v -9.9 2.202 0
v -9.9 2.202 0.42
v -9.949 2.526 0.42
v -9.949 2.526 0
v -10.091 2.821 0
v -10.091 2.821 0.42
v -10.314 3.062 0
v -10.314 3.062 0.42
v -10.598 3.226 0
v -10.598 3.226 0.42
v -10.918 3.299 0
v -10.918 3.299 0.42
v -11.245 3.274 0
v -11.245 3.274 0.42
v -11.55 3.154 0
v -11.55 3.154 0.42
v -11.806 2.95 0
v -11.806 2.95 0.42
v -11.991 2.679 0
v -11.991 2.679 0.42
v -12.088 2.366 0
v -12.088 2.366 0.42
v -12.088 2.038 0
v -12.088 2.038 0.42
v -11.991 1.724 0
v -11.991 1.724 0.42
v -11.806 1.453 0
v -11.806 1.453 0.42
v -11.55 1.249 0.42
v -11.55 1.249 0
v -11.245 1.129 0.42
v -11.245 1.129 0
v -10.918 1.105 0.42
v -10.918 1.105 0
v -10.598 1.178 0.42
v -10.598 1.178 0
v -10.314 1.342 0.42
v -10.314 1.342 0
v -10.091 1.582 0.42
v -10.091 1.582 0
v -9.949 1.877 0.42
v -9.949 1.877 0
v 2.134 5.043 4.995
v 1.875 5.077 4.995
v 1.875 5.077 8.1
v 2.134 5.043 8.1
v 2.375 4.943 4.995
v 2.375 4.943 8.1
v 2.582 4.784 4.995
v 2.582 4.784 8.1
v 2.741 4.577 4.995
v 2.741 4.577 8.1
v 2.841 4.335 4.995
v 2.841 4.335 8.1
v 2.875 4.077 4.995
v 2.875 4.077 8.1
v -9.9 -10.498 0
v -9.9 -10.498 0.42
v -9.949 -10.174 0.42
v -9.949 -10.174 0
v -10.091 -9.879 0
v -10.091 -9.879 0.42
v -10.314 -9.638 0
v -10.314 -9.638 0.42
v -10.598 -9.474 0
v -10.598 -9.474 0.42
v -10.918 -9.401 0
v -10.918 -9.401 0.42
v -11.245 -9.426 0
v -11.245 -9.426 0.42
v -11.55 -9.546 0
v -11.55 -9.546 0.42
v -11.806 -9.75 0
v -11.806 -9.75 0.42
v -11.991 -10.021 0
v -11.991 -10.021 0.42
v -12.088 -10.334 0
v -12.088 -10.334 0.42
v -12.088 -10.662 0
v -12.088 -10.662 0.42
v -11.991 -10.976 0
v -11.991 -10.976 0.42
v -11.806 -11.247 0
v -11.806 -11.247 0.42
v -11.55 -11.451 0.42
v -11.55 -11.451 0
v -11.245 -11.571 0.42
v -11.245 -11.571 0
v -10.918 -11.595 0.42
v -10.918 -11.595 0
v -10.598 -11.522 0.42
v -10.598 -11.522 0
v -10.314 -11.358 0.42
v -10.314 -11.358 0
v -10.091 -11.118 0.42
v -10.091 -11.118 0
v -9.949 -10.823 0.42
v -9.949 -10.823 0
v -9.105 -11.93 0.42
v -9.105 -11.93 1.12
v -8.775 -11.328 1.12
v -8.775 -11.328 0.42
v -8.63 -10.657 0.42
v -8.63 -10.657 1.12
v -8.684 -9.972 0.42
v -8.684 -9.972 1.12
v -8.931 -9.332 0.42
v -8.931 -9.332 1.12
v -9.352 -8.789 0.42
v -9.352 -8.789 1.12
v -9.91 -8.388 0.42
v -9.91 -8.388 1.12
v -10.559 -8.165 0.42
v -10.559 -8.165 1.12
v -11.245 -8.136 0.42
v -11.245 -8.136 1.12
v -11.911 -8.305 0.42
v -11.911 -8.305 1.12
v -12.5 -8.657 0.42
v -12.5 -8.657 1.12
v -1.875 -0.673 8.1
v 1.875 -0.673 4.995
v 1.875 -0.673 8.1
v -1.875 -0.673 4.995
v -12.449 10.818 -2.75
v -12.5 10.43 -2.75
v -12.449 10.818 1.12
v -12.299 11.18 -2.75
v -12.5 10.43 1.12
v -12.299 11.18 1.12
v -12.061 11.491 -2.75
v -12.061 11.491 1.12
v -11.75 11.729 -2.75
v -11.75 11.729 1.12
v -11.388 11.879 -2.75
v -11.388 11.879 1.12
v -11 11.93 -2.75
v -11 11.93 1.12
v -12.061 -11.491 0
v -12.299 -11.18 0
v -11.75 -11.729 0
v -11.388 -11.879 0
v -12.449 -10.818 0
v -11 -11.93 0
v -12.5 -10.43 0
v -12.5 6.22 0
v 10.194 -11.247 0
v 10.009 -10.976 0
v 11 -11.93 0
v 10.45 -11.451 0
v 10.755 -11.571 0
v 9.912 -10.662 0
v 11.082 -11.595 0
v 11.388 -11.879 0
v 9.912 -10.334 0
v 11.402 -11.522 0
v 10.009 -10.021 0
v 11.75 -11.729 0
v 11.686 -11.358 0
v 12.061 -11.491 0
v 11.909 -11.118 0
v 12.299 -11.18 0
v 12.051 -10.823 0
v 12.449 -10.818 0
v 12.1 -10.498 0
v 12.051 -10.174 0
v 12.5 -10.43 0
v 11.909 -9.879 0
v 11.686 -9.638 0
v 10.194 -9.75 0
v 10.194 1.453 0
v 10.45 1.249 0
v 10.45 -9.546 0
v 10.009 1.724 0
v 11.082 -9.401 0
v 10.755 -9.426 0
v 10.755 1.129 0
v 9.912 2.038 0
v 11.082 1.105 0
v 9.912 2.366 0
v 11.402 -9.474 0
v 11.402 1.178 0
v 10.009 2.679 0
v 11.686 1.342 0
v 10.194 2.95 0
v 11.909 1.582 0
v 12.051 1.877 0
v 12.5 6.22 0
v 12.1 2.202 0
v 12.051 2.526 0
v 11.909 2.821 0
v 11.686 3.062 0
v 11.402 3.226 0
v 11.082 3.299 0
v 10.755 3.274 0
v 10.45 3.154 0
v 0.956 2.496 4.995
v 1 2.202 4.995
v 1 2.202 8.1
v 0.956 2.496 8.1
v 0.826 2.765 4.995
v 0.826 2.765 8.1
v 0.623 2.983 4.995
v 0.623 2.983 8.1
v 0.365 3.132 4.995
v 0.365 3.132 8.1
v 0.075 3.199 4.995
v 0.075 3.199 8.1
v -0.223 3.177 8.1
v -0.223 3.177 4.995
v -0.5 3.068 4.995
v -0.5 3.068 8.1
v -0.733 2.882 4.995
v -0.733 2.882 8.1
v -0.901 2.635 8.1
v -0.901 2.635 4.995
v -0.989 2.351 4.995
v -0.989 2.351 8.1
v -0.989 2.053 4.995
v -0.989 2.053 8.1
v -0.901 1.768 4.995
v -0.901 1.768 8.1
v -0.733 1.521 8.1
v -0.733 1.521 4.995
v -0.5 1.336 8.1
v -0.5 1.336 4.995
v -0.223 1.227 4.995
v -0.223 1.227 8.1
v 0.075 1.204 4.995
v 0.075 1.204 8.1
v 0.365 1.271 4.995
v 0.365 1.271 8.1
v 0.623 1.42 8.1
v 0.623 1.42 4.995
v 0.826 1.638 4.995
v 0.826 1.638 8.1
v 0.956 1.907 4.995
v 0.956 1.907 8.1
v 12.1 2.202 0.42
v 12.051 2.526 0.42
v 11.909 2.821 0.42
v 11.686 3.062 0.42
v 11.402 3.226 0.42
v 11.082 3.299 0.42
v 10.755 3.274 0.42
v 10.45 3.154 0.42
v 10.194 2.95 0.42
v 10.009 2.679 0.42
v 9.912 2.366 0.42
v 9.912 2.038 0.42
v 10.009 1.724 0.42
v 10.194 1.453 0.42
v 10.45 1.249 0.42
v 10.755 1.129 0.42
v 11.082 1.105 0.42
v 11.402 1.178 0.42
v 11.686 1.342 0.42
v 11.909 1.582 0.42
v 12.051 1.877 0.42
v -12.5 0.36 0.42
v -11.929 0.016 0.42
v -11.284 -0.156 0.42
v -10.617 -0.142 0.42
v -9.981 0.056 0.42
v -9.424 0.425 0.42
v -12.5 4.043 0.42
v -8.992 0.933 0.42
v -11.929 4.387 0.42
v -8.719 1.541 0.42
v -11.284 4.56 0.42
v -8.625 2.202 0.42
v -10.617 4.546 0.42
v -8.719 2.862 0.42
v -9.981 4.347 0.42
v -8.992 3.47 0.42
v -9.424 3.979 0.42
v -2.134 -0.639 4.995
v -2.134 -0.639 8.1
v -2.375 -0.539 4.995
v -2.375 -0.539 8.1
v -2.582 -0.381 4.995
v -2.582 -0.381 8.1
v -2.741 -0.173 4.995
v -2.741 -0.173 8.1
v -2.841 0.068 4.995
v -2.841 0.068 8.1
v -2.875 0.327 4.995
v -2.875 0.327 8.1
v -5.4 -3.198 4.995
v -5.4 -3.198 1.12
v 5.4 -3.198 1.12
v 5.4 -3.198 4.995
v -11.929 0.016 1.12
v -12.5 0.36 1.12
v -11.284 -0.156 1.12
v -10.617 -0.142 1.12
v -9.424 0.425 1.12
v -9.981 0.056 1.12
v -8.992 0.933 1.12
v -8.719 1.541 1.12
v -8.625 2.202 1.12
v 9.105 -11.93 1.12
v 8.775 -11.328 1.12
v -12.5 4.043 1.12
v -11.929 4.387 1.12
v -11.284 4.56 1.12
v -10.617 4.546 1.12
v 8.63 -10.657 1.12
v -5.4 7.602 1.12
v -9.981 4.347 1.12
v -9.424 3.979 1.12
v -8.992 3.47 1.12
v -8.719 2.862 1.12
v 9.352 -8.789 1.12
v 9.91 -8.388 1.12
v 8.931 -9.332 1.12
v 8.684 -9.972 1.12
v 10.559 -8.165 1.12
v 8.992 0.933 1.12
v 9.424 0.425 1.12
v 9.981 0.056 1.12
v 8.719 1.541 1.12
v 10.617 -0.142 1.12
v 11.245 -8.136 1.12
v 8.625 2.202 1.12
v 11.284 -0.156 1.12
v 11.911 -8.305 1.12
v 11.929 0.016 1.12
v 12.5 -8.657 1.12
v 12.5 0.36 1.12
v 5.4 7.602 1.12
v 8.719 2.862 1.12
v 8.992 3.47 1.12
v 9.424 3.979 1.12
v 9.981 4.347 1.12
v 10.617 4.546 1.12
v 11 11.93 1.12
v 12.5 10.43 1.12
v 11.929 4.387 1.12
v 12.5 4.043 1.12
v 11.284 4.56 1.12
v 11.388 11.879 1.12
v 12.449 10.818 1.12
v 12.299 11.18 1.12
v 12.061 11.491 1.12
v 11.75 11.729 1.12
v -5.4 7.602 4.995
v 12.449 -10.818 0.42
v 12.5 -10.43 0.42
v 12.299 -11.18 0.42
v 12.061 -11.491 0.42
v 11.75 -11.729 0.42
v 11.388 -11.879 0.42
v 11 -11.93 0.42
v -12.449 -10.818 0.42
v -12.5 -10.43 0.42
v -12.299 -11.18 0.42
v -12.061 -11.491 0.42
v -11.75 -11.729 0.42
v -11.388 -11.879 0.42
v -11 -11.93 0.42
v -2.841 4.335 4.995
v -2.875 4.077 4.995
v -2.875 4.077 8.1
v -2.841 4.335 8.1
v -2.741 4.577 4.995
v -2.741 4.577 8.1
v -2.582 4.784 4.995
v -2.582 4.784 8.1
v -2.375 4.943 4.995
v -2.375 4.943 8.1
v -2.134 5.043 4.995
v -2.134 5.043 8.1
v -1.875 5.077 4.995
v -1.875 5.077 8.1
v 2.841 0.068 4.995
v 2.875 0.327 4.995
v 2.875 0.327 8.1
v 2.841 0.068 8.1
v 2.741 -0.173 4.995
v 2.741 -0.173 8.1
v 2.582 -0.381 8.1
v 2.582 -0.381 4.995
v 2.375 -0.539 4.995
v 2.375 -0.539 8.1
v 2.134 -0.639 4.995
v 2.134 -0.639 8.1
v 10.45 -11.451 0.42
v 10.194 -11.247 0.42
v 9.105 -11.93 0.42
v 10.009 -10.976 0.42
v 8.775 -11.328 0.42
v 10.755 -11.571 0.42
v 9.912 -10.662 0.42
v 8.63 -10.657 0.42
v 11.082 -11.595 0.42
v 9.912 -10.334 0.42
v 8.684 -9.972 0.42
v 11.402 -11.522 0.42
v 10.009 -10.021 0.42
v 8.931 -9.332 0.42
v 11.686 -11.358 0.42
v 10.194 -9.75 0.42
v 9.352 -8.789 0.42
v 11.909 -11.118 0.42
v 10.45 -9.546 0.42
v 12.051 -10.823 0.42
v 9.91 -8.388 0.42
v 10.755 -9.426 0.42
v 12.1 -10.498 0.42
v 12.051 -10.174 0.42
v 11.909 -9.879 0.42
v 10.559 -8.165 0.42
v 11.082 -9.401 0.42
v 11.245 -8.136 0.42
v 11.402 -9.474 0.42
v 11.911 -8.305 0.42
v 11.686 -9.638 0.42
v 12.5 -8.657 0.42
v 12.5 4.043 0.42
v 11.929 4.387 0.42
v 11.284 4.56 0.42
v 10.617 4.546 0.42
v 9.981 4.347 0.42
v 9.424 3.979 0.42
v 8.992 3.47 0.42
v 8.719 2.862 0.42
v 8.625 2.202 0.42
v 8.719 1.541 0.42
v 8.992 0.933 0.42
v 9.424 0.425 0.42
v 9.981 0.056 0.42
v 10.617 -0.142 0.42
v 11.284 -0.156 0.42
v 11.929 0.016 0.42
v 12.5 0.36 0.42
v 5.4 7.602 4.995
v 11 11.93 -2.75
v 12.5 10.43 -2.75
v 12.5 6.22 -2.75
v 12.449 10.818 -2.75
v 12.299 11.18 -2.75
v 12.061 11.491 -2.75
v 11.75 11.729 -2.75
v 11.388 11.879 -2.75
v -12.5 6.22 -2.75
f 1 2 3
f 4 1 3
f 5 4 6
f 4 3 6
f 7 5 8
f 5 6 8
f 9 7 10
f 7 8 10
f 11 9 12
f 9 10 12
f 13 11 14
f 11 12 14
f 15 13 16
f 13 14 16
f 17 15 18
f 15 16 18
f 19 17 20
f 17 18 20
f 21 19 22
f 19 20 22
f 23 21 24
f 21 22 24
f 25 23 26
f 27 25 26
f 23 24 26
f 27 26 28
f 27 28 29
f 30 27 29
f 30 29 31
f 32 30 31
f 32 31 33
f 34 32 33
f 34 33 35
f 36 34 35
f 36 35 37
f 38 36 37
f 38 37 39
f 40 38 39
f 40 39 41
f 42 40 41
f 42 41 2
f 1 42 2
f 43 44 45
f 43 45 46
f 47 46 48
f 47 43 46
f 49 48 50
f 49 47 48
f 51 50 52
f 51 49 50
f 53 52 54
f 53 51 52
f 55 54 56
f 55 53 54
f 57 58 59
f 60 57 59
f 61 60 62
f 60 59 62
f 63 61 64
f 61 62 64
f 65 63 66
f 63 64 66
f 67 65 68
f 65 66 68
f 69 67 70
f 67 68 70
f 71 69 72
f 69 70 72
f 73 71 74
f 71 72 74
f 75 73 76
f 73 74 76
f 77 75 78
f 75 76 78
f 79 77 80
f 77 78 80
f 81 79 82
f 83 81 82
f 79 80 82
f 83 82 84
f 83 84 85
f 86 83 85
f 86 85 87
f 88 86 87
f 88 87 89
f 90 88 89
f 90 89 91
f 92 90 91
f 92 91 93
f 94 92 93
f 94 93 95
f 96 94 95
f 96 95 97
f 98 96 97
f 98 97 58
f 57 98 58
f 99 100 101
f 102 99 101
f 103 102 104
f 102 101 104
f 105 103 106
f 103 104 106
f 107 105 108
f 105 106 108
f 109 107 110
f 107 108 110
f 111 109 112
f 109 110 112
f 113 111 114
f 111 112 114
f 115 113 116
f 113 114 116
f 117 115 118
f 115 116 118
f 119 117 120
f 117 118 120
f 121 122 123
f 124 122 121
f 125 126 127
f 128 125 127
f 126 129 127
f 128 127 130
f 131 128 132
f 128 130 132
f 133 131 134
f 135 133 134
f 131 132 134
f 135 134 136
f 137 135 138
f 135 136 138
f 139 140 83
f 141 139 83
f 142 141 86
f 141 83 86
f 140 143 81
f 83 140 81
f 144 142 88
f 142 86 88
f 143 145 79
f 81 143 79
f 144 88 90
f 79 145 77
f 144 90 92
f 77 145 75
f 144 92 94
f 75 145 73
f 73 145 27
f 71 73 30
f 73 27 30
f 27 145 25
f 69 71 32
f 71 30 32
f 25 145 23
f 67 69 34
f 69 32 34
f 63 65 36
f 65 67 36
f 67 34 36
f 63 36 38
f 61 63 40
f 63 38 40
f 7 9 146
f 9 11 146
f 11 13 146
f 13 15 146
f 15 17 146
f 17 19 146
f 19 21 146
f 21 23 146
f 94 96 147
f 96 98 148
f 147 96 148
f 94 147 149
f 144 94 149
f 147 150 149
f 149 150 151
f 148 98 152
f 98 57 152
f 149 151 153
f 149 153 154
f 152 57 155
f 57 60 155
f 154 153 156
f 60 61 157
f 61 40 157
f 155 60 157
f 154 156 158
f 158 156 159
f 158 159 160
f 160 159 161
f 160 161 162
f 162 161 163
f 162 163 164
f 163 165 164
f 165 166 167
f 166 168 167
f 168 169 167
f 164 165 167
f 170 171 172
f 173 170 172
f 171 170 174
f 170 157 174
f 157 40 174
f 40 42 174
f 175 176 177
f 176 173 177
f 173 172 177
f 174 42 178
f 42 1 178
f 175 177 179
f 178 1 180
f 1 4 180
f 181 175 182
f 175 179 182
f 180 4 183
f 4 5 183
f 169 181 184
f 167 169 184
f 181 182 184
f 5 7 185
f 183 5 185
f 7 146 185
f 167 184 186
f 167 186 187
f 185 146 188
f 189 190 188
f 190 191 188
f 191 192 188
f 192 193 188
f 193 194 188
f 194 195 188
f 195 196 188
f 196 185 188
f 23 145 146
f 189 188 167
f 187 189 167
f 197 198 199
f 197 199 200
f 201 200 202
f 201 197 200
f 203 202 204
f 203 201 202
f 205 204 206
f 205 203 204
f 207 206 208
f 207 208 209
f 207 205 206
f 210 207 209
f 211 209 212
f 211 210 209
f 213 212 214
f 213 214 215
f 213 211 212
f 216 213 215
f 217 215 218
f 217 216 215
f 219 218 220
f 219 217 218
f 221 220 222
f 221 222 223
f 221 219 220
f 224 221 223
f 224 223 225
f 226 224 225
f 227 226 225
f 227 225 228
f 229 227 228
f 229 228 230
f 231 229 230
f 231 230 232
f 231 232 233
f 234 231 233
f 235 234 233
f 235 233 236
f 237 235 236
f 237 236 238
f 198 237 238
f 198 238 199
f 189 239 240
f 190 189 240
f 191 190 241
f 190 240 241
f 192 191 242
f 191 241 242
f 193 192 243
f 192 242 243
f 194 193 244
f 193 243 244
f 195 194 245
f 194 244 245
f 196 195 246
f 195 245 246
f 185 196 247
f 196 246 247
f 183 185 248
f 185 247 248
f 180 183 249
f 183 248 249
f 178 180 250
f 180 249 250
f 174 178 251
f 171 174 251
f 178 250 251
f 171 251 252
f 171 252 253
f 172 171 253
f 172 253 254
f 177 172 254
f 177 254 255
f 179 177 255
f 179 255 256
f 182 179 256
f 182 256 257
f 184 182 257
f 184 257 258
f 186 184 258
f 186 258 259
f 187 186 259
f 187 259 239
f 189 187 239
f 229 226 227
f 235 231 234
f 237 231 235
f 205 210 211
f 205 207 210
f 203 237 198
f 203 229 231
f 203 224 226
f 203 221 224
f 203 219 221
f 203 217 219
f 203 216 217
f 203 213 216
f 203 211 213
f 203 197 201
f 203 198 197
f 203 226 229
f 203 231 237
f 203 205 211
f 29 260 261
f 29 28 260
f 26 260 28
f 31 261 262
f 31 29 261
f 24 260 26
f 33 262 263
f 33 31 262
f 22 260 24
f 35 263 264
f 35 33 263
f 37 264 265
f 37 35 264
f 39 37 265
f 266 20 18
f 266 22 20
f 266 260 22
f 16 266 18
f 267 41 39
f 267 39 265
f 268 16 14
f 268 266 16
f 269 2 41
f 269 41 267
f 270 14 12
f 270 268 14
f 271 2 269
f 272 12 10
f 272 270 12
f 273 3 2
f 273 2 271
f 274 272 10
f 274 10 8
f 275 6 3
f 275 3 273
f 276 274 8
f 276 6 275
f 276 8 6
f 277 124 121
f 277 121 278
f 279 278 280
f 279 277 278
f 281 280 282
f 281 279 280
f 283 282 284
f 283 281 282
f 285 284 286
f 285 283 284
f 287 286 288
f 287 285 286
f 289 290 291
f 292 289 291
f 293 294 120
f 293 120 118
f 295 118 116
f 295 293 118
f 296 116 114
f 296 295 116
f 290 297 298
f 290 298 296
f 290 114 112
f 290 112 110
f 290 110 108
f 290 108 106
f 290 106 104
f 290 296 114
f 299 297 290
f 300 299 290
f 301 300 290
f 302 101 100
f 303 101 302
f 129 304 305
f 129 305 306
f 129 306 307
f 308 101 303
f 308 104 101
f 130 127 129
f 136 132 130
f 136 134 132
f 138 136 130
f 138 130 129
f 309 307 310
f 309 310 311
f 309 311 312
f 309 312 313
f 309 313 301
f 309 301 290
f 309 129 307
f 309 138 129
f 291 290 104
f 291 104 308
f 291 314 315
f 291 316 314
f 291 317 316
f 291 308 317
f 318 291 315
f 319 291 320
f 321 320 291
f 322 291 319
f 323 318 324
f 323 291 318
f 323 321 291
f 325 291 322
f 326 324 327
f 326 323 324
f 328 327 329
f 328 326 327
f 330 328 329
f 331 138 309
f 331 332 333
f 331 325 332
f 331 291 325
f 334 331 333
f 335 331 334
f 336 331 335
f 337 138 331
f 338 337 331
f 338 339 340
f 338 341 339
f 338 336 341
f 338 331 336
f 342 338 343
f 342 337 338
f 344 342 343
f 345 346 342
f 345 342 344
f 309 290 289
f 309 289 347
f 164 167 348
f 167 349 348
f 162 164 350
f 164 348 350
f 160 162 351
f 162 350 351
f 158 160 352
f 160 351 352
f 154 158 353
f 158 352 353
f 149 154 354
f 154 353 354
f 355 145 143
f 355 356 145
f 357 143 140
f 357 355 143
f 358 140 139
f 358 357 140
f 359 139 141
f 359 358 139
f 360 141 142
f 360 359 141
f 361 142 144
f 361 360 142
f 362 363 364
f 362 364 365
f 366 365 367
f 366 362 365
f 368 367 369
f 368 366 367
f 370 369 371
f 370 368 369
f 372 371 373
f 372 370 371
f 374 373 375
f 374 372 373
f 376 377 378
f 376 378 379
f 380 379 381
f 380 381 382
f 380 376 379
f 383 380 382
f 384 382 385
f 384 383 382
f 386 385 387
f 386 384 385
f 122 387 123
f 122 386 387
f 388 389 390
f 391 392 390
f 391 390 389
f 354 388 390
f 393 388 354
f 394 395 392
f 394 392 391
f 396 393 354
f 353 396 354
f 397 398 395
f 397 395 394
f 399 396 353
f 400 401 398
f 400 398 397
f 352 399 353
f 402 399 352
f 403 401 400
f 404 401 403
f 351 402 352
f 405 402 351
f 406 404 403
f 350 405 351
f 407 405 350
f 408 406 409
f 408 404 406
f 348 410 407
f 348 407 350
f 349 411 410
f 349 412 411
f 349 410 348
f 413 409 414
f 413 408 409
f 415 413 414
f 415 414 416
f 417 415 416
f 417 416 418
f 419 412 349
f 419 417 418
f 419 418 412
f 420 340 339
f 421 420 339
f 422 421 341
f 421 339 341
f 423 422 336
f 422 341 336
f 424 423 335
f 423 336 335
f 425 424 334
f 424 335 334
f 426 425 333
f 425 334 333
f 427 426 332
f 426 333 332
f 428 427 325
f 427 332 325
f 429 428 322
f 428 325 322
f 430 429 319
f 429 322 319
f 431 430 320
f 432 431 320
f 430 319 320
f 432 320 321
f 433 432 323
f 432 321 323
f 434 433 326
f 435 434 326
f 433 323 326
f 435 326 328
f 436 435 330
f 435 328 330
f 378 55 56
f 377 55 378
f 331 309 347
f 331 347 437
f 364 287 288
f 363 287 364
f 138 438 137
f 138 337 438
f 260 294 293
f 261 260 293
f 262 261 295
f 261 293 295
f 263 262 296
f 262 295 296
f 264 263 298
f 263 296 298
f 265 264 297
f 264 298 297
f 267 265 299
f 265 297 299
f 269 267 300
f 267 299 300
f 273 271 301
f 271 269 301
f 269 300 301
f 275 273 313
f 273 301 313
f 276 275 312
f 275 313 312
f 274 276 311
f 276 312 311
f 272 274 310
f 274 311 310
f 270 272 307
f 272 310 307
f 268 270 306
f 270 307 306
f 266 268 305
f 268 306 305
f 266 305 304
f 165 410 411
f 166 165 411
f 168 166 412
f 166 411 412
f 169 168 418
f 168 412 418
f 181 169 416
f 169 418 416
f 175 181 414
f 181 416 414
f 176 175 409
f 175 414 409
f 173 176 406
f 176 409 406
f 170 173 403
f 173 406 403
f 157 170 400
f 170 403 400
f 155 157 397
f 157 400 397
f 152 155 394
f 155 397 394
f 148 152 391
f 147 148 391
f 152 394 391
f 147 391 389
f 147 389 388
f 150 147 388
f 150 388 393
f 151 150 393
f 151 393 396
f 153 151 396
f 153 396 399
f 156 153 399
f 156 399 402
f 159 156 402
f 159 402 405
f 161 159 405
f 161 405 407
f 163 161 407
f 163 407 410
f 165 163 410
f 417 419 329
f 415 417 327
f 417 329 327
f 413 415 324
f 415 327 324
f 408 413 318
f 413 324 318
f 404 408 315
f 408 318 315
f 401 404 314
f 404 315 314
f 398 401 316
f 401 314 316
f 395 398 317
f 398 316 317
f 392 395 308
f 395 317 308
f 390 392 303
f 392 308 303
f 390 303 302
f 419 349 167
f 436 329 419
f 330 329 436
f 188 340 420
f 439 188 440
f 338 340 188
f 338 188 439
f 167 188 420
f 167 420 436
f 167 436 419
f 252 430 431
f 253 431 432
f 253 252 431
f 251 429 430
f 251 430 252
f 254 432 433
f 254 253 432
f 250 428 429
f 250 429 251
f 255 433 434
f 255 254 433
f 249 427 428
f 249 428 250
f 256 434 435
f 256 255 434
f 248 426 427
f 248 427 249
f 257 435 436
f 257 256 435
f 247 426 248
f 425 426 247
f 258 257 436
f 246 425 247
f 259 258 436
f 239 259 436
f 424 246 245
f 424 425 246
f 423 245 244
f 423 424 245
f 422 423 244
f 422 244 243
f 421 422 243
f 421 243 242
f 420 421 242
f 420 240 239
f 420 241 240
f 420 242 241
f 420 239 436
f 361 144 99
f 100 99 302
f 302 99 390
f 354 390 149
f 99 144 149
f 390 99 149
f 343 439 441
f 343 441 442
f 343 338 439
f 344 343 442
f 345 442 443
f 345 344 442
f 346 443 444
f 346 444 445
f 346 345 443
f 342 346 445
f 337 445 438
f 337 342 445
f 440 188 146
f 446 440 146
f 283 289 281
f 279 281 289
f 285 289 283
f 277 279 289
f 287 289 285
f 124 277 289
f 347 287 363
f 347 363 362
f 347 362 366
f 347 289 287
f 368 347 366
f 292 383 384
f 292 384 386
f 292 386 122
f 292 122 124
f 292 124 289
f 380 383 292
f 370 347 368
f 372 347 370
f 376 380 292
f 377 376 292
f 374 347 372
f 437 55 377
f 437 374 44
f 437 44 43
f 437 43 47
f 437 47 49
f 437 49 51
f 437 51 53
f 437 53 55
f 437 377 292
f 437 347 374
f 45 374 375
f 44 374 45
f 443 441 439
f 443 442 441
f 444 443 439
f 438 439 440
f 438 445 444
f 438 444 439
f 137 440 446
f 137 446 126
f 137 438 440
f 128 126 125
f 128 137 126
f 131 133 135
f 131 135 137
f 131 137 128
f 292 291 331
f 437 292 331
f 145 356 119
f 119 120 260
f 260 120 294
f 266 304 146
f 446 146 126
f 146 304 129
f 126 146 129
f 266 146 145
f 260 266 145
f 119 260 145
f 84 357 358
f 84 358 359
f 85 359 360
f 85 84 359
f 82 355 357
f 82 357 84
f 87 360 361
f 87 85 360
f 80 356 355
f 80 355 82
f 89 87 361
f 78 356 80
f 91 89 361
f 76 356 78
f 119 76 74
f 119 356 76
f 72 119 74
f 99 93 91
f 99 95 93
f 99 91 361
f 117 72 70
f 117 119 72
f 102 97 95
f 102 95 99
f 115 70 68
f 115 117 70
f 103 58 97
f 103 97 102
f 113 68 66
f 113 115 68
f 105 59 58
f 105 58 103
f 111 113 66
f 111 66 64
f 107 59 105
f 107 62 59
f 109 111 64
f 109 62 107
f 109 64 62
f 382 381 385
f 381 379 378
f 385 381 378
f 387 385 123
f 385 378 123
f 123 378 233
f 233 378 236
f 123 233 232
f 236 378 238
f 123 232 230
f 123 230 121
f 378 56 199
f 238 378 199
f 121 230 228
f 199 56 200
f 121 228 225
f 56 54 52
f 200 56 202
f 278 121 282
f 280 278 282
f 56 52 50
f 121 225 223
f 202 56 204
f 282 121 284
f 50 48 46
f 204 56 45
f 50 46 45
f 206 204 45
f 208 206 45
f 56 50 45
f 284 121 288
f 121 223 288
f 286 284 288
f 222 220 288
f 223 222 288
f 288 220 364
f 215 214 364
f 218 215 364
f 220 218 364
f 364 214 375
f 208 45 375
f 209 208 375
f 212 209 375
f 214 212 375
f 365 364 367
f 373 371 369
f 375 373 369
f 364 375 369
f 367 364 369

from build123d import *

# Parameters (mm, degrees)
SKETCH1_W           = 25
SKETCH1_H           = 23.86
BOSS_EXTRUDE1_DEPTH = 1.12
SKETCH4_W           = 10.8
SKETCH4_H           = 10.8
BOSS_EXTRUDE2_DEPTH = 3.875
SKETCH5_R           = 2.375
CUT_EXTRUDE1_DEPTH  = 0.7
CUT_EXTRUDE2_REACH  = 19.708
SKETCH6_R           = 1.1
SKETCH8_R           = 1
BOSS_EXTRUDE3_DEPTH = 6.98
SKETCH9_W           = 25
SKETCH9_H           = 5.71
BOSS_EXTRUDE4_DEPTH = 2.75
FILLET1_R           = 1.5


with BuildPart() as part:
    # Sketch1 → Boss-Extrude1 (new body)
    with BuildSketch(Plane.XY):
        Rectangle(SKETCH1_W, SKETCH1_H)
    extrude(amount=BOSS_EXTRUDE1_DEPTH)

    # Sketch4 → Boss-Extrude2 (add)
    with BuildSketch(Plane.XY.offset(1.12)):
        with Locations((0, 2.2016)):
            Rectangle(SKETCH4_W, SKETCH4_H)
    extrude(amount=BOSS_EXTRUDE2_DEPTH)

    # Sketch5 → Cut-Extrude1 (cut)
    with BuildSketch(Plane.XY.offset(1.12)):
        with Locations((11, 2.2016)):
            Circle(SKETCH5_R)
        with Locations((11, -10.4984)):
            Circle(SKETCH5_R)
        with Locations((-11, -10.4984)):
            Circle(SKETCH5_R)
        with Locations((-11, 2.2016)):
            Circle(SKETCH5_R)
    extrude(amount=-CUT_EXTRUDE1_DEPTH, mode=Mode.SUBTRACT)

    # Sketch6 → Cut-Extrude2 (cut, up to next)
    with BuildSketch(Plane.XY.offset(1.12), mode=Mode.PRIVATE) as cut_extrude2_sk1:
        with Locations((11, 2.2016)):
            Circle(SKETCH6_R)
    cut_extrude2_tool1 = extrude(cut_extrude2_sk1.sketch, amount=-CUT_EXTRUDE2_REACH, mode=Mode.PRIVATE) & part.part
    # Sketch6 → Cut-Extrude2 (cut, up to next)
    with BuildSketch(Plane.XY.offset(1.12), mode=Mode.PRIVATE) as cut_extrude2_sk2:
        with Locations((11, -10.4984)):
            Circle(SKETCH6_R)
    cut_extrude2_tool2 = extrude(cut_extrude2_sk2.sketch, amount=-CUT_EXTRUDE2_REACH, mode=Mode.PRIVATE) & part.part
    # Sketch6 → Cut-Extrude2 (cut, up to next)
    with BuildSketch(Plane.XY.offset(1.12), mode=Mode.PRIVATE) as cut_extrude2_sk3:
        with Locations((-11, -10.4984)):
            Circle(SKETCH6_R)
    cut_extrude2_tool3 = extrude(cut_extrude2_sk3.sketch, amount=-CUT_EXTRUDE2_REACH, mode=Mode.PRIVATE) & part.part
    # Sketch6 → Cut-Extrude2 (cut, up to next)
    with BuildSketch(Plane.XY.offset(1.12), mode=Mode.PRIVATE) as cut_extrude2_sk4:
        with Locations((-11, 2.2016)):
            Circle(SKETCH6_R)
    cut_extrude2_tool4 = extrude(cut_extrude2_sk4.sketch, amount=-CUT_EXTRUDE2_REACH, mode=Mode.PRIVATE) & part.part
    add(cut_extrude2_tool1.solids().sort_by_distance((11, 2.2016, 1.12))[0], mode=Mode.SUBTRACT)
    add(cut_extrude2_tool2.solids().sort_by_distance((11, -10.4984, 1.12))[0], mode=Mode.SUBTRACT)
    add(cut_extrude2_tool3.solids().sort_by_distance((-11, -10.4984, 1.12))[0], mode=Mode.SUBTRACT)
    add(cut_extrude2_tool4.solids().sort_by_distance((-11, 2.2016, 1.12))[0], mode=Mode.SUBTRACT)

    # Sketch8 → Boss-Extrude3 (add)
    with BuildSketch(Plane.XY.offset(1.12)):
        with BuildLine():
            Line((2.875, 4.0766), (2.875, 0.3266))
            ThreePointArc((2.875, 0.3266), (2.582106781, -0.380506781), (1.875, -0.6734))
            Line((1.875, -0.6734), (-1.875, -0.6734))
            ThreePointArc((-1.875, -0.6734), (-2.582106781, -0.380506781), (-2.875, 0.3266))
            Line((-2.875, 0.3266), (-2.875, 4.0766))
            ThreePointArc((-2.875, 4.0766), (-2.582106781, 4.783706781), (-1.875, 5.0766))
            Line((-1.875, 5.0766), (1.875, 5.0766))
            ThreePointArc((1.875, 5.0766), (2.582106781, 4.783706781), (2.875, 4.0766))
        make_face()
        with Locations((0, 2.2016)):
            Circle(SKETCH8_R, mode=Mode.SUBTRACT)
    extrude(amount=BOSS_EXTRUDE3_DEPTH)

    # Sketch9 → Boss-Extrude4 (add)
    with BuildSketch(Plane(origin=(0, 0, 0), x_dir=(-1, 0, 0), z_dir=(0, 0, -1))):
        with Locations((0, 9.075)):
            Rectangle(SKETCH9_W, SKETCH9_H)
    extrude(amount=BOSS_EXTRUDE4_DEPTH)

    # Fillet1
    fillet1_edges = [part.edges().sort_by_distance(p)[0] for p in [
        (12.5, -11.93, 0.21),
        (-12.5, -11.93, 0.21),
        (12.5, 11.93, -0.815),
        (-12.5, 11.93, -0.815),
    ]]
    fillet(fillet1_edges, radius=FILLET1_R)


solid = part.part
